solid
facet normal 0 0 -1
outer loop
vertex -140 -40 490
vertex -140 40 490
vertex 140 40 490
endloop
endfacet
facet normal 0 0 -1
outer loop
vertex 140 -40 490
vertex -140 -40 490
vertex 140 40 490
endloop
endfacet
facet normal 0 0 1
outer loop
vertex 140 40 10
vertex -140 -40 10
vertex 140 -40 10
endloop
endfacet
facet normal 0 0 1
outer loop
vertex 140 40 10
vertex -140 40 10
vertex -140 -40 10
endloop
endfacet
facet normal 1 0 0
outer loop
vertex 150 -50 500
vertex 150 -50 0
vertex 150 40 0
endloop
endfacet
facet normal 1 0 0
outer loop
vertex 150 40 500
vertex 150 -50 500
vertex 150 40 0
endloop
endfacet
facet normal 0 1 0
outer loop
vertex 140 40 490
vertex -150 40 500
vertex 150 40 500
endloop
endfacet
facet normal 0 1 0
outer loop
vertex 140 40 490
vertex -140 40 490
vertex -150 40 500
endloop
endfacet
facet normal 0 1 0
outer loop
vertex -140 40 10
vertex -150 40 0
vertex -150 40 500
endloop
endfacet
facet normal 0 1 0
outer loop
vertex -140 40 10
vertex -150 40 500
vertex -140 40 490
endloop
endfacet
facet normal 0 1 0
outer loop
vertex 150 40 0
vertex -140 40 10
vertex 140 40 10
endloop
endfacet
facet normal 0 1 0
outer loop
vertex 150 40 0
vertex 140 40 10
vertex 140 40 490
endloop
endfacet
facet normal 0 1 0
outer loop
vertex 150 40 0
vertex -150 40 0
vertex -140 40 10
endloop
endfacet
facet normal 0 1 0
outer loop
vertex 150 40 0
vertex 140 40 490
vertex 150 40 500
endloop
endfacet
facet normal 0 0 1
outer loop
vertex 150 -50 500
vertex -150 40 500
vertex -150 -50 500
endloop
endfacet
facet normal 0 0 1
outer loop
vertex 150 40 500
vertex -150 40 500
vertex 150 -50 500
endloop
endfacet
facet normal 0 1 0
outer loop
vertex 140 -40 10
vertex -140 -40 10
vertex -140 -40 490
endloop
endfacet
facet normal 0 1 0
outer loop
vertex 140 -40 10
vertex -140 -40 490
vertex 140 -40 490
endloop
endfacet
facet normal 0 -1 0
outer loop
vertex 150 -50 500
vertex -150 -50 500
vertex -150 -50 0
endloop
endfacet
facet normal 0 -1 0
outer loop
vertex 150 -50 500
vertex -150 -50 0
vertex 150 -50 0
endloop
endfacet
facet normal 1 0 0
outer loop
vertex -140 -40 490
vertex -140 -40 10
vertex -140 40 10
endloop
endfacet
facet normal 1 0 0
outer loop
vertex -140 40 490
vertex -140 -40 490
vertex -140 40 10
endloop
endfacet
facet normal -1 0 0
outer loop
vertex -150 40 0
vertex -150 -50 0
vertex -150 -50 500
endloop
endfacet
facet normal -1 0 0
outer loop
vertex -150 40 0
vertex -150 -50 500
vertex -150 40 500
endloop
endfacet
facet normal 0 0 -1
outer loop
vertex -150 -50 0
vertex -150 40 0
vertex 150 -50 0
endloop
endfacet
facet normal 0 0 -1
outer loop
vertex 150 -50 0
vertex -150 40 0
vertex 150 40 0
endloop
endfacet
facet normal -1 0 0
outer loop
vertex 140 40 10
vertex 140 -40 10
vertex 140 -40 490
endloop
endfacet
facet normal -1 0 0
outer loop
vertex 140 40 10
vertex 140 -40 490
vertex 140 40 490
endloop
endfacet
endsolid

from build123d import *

# Parameters (mm, degrees)
SKETCH1_W           = 300
SKETCH1_H           = 100
BOSS_EXTRUDE1_DEPTH = 500
SHELL2_T            = 10
SKETCH2_W           = 300
SKETCH2_H           = 500
CUT_EXTRUDE1_DEPTH  = 10


with BuildPart() as part:
    # Sketch1 → Boss-Extrude1 (new body)
    with BuildSketch(Plane.XY):
        Rectangle(SKETCH1_W, SKETCH1_H)
    extrude(amount=BOSS_EXTRUDE1_DEPTH)

    # Shell2 (no face opened: a closed hollow body)
    add(offset(amount=-SHELL2_T, mode=Mode.PRIVATE), mode=Mode.SUBTRACT)

    # Sketch2 → Cut-Extrude1 (cut)
    with BuildSketch(Plane(origin=(0, 50, 0), x_dir=(1, 0, 0), z_dir=(0, 1, 0))):
        with Locations((0, -250)):
            Rectangle(SKETCH2_W, SKETCH2_H)
    extrude(amount=-CUT_EXTRUDE1_DEPTH, mode=Mode.SUBTRACT)


solid = part.part
